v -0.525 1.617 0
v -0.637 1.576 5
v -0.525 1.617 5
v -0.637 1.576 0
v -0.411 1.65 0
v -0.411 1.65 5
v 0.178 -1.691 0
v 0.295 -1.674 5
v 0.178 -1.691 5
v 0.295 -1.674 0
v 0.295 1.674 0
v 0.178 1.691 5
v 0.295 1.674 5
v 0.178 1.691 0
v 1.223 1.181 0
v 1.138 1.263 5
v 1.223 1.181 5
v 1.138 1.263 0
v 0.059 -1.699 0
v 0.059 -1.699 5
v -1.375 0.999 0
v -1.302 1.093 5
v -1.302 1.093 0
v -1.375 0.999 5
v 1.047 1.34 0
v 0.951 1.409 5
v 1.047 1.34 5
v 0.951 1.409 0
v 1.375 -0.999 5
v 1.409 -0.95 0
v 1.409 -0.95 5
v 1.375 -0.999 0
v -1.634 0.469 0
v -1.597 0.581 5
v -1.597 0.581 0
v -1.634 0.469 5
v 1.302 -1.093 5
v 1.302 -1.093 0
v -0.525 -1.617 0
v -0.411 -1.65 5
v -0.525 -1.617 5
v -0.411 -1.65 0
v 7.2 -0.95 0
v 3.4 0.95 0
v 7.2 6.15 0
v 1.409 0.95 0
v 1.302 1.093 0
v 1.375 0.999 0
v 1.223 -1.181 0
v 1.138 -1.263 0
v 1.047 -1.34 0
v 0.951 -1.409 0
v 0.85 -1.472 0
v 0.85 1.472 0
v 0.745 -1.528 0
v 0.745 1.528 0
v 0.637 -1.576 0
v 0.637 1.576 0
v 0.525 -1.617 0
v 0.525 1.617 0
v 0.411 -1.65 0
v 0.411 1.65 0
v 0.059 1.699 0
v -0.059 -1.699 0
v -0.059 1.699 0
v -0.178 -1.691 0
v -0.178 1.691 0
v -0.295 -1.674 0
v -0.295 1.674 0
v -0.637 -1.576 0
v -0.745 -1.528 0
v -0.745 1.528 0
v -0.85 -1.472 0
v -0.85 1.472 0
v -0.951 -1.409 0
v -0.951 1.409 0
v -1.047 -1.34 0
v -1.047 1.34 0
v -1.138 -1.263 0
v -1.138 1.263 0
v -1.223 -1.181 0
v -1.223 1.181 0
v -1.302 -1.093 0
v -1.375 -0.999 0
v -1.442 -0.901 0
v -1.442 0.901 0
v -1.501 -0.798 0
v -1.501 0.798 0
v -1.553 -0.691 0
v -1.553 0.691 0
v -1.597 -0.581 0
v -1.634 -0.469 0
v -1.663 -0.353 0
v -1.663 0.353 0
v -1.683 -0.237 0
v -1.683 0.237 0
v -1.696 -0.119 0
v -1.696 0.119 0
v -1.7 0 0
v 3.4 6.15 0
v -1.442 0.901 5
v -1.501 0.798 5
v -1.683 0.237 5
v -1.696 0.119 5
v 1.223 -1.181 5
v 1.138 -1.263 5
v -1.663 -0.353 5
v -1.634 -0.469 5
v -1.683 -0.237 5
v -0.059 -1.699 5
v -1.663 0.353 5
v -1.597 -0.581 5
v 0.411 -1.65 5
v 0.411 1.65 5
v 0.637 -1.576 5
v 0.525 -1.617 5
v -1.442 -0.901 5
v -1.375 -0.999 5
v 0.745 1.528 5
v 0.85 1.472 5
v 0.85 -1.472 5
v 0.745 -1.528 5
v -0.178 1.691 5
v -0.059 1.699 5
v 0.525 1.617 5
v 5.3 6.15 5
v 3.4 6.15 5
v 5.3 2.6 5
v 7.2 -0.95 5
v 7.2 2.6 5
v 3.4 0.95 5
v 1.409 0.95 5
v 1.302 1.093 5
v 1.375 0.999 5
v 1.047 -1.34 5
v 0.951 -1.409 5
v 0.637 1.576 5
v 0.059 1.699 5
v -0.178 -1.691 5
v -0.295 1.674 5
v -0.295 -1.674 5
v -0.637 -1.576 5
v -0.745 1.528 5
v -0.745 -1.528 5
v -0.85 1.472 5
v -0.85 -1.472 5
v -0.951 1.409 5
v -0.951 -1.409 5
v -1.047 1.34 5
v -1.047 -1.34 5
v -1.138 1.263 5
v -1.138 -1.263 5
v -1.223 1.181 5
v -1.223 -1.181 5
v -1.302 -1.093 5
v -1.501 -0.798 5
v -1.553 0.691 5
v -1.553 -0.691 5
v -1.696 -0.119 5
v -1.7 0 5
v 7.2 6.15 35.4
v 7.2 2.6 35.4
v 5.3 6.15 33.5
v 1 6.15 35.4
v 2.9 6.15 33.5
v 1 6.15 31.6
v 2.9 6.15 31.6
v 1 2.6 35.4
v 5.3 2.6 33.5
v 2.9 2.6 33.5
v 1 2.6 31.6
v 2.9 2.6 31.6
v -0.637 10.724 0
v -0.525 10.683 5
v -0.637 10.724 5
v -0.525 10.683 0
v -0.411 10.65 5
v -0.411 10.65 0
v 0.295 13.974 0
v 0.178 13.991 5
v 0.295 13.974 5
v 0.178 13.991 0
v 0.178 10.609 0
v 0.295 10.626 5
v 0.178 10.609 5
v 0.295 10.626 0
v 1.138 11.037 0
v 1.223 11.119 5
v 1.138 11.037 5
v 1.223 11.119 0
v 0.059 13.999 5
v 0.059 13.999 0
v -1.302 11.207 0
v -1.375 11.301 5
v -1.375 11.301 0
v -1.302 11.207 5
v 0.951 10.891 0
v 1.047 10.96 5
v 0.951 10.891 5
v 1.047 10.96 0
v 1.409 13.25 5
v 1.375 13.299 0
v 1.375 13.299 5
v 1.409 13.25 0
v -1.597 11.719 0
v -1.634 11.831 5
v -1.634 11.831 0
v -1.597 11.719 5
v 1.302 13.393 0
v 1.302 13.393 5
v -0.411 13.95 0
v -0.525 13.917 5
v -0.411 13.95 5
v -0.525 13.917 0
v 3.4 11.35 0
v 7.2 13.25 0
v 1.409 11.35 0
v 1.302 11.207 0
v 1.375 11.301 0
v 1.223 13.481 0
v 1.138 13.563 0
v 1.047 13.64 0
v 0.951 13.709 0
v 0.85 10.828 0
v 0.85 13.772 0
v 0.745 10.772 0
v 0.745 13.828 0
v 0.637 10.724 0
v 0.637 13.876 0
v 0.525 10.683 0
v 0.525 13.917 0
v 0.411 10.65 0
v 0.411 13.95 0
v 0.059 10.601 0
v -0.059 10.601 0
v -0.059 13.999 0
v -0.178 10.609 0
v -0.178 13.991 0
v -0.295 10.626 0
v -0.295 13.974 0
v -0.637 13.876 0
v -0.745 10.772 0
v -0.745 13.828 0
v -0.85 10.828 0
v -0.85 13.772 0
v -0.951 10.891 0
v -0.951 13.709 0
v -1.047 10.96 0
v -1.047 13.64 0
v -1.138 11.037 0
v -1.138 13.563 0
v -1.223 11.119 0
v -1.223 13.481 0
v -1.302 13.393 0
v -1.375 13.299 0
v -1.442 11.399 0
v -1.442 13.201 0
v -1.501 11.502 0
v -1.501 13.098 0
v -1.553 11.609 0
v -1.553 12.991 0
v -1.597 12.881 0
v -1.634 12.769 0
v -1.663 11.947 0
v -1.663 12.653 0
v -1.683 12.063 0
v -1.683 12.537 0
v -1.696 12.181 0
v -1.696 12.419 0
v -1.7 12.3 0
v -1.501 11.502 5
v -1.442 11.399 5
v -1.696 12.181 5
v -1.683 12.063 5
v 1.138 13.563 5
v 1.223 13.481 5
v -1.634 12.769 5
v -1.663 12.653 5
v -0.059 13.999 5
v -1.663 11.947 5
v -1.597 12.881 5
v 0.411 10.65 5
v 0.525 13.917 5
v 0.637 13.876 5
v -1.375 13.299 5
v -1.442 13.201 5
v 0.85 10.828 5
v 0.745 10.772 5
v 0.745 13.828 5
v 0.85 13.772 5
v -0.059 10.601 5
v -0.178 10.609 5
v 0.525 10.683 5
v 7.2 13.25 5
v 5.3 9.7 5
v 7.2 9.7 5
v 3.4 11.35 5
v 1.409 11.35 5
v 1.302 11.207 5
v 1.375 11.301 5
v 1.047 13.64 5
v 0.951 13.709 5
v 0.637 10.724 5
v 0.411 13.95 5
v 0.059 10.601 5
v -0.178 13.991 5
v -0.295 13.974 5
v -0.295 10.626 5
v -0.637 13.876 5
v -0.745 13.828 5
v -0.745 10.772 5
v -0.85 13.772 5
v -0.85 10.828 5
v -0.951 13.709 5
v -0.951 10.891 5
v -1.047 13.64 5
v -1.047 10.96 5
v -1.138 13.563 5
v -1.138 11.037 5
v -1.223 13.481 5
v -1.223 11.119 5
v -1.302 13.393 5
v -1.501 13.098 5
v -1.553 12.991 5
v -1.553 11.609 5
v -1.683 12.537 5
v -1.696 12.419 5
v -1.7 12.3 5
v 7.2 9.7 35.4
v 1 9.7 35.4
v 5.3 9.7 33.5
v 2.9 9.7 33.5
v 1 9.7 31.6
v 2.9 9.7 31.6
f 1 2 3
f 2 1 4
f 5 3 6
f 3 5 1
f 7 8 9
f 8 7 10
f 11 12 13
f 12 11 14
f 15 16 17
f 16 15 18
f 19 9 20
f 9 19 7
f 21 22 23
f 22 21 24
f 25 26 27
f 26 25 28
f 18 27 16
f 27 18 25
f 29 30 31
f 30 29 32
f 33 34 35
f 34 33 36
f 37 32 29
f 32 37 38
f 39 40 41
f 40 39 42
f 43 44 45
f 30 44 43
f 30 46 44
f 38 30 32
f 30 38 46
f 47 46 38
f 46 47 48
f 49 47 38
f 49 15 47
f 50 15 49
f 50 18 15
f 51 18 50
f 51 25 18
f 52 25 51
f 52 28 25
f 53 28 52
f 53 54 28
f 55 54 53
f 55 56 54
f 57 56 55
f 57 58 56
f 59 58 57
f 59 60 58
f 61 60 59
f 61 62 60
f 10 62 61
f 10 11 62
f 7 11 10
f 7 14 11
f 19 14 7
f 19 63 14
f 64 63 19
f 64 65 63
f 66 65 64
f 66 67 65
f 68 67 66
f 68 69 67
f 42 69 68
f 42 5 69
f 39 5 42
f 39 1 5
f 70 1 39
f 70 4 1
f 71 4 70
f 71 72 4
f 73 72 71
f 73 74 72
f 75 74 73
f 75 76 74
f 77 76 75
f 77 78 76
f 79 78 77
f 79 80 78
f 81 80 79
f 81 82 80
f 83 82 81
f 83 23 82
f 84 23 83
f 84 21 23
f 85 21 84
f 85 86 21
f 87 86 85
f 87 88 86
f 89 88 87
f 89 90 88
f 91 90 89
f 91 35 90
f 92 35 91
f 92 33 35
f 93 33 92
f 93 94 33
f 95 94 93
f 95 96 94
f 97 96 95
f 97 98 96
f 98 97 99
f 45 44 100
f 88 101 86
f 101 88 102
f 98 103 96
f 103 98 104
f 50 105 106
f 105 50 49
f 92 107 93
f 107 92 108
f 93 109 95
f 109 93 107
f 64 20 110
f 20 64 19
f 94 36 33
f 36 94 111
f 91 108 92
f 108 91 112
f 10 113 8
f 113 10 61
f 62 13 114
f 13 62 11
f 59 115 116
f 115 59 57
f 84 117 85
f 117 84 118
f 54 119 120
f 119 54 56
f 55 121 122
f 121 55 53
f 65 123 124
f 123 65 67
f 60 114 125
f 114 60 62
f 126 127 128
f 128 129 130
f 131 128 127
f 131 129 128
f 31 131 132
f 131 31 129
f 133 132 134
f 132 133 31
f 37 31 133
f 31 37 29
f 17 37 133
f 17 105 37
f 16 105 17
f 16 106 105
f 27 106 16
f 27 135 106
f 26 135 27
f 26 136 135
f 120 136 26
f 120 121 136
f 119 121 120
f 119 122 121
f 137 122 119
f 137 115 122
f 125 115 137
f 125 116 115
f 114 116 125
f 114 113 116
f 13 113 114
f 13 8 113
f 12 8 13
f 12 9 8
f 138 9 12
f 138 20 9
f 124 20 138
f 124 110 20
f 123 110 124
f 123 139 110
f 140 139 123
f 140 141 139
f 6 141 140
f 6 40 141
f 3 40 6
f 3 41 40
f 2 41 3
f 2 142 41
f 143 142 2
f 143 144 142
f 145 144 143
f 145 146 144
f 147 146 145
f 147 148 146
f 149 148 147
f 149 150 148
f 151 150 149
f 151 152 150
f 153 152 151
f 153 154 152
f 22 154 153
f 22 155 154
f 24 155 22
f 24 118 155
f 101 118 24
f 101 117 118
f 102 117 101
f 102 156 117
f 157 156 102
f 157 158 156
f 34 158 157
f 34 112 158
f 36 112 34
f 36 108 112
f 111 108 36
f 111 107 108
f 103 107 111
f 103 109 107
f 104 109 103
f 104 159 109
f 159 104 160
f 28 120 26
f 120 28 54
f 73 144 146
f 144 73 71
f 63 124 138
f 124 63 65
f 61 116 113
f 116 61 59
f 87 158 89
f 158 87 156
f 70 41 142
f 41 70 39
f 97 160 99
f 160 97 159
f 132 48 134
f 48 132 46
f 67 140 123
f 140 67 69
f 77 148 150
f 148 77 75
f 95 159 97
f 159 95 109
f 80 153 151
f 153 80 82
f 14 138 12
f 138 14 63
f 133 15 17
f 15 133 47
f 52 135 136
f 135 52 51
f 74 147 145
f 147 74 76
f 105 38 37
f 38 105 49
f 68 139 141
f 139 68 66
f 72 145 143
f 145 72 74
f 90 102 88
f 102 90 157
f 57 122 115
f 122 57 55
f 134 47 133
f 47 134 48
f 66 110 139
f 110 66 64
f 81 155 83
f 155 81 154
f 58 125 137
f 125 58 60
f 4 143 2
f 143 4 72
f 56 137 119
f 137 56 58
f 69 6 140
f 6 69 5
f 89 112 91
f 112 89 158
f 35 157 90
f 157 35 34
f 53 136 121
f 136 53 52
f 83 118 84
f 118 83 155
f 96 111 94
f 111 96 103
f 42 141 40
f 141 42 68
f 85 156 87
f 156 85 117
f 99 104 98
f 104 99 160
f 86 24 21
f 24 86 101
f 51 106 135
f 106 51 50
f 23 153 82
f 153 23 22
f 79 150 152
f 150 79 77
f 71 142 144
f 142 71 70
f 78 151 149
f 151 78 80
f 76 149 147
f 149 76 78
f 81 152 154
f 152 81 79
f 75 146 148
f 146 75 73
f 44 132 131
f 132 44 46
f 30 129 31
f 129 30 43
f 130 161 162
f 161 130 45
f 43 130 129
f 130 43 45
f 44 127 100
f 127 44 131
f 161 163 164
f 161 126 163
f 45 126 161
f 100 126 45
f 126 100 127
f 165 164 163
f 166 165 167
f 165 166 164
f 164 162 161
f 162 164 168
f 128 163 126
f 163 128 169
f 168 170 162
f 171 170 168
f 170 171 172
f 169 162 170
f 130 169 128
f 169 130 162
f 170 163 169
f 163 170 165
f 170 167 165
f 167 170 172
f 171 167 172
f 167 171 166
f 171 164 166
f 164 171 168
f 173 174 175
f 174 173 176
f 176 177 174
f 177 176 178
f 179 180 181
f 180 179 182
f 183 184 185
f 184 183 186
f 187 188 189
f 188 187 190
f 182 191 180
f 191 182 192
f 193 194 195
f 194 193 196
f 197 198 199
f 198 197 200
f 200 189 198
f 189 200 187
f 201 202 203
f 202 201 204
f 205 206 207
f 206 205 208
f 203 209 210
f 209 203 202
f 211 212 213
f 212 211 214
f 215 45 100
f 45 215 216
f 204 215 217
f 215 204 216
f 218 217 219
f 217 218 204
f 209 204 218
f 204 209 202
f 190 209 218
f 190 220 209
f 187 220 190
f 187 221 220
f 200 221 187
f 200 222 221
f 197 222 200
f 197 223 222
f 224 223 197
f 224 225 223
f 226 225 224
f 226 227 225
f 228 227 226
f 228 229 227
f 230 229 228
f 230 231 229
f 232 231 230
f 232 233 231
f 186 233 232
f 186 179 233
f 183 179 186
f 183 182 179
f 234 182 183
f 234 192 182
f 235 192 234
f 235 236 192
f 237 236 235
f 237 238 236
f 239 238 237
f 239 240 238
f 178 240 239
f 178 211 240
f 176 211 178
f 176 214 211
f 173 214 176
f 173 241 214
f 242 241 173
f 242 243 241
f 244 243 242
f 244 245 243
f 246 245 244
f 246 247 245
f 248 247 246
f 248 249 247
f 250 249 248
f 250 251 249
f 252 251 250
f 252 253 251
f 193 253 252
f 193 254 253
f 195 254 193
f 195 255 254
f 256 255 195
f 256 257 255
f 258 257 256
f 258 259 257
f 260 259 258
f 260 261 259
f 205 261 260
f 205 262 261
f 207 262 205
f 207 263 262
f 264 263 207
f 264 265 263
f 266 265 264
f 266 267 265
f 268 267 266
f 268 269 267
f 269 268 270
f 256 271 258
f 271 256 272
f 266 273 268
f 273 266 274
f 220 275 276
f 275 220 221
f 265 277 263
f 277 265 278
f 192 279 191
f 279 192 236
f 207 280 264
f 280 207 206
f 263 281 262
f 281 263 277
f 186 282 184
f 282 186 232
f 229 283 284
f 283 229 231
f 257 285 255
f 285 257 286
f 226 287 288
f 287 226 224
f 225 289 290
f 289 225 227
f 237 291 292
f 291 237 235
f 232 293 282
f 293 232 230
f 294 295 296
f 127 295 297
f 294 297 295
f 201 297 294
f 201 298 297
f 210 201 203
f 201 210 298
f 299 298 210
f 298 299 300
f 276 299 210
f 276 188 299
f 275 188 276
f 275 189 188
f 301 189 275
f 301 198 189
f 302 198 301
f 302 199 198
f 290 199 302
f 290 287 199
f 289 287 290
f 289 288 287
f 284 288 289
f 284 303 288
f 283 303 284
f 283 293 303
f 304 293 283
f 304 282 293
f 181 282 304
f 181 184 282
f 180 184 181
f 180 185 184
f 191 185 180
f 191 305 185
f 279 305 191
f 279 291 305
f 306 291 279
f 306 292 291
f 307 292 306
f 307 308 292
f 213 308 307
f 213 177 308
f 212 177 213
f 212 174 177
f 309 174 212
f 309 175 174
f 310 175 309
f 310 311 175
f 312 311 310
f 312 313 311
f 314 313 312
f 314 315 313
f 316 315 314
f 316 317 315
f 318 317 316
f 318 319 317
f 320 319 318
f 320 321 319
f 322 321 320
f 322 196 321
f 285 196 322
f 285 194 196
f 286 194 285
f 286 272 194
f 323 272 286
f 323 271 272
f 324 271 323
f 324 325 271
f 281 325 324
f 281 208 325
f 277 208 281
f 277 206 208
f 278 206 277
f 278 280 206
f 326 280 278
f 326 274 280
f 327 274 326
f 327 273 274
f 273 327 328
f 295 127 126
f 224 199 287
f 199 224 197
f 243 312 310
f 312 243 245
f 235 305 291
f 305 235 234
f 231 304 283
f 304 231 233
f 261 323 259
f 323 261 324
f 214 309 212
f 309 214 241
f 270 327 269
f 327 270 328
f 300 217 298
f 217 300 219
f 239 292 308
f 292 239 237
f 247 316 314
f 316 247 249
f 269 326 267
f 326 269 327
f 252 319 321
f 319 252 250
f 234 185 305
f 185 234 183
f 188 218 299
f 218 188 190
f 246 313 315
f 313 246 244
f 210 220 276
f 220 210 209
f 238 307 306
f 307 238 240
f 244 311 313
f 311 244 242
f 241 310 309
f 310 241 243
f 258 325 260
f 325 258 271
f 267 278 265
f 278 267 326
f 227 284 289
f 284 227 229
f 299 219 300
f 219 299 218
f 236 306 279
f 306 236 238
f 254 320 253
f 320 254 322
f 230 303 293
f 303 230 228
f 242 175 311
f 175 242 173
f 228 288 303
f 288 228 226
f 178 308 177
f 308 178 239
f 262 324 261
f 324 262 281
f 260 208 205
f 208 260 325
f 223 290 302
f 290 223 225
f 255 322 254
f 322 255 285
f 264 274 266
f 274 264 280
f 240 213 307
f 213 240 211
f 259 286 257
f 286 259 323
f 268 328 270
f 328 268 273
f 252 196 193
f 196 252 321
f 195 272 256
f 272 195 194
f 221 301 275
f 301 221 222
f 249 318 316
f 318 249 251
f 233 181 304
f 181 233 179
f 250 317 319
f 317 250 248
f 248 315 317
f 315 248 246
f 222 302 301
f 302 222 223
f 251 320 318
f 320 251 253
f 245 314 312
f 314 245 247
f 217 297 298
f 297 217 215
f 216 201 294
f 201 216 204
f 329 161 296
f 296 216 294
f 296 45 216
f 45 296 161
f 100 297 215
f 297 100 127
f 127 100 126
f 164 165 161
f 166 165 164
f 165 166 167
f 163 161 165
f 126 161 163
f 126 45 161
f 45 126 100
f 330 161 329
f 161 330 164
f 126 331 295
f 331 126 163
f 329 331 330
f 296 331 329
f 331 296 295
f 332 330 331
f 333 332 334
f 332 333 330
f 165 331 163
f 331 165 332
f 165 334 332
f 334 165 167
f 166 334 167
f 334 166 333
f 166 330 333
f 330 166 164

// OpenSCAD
/*
 * Race track guardrail holder
 *
 * Author: Pavel Rampas
 * Version: 1.0.0 (Changelog is at the bottom)
 * License: CC BY-SA 4.0 [https://creativecommons.org/licenses/by-sa/4.0/]
 * Link: https://github.com/pavelrampas/openscad-models
 *
 * OpenSCAD version: 2021.01
 *
 * Instructions:
 * Set up parameters, render and print.
 *
 * Height is layer.
 * Thickness is perimeter.
 */

// Parameters
//------------------------------------------------------------------------------

$fn = $preview ? 15 : 90;

height = 5;
endDiameter = 3.4;
width = 7;
length = 14.2;
thickness = 1.9;

guardrail_height = 28.5;
guardrail_thickness = 2.4;

// Code
//------------------------------------------------------------------------------

_half_part();
translate([0, length - thickness, 0]){
    mirror([0, 1, 0]) {
        _half_part();
    }
}

// Functions
//------------------------------------------------------------------------------

// Modules
//------------------------------------------------------------------------------

// half part of the model
module _half_part() {
    cylinder(h = height, d = endDiameter);
    translate([0, -(thickness / 2), 0]) {
        cube([width - (endDiameter / 2), thickness, height]);
    }
    translate([width - (endDiameter / 2) - thickness, -(thickness / 2), 0]) {
        cube([thickness * 2, length / 2, height]);
    }
    // column
    translate([
        (width + thickness) - (endDiameter / 2) - thickness,
        (length / 2) - (length / 4) - (thickness / 2),
        0
    ]) {
        cube([thickness, length / 4, guardrail_height + height + thickness]);
    }
    // hook
    translate([
        (width) - (endDiameter / 2) - guardrail_thickness,
        (length / 2) - (length / 4) - (thickness / 2),
        guardrail_height + height
    ]) {
        cube([guardrail_thickness, length / 4, thickness]);
    }
    translate([
        (width) - (endDiameter / 2) - thickness - guardrail_thickness,
        (length / 2) - (length / 4) - (thickness / 2),
        guardrail_height + height - thickness
    ]) {
        cube([thickness, length / 4, thickness * 2]);
    }
}

// Changelog
//------------------------------------------------------------------------------

// [1.0.0]:
// Initial release.
